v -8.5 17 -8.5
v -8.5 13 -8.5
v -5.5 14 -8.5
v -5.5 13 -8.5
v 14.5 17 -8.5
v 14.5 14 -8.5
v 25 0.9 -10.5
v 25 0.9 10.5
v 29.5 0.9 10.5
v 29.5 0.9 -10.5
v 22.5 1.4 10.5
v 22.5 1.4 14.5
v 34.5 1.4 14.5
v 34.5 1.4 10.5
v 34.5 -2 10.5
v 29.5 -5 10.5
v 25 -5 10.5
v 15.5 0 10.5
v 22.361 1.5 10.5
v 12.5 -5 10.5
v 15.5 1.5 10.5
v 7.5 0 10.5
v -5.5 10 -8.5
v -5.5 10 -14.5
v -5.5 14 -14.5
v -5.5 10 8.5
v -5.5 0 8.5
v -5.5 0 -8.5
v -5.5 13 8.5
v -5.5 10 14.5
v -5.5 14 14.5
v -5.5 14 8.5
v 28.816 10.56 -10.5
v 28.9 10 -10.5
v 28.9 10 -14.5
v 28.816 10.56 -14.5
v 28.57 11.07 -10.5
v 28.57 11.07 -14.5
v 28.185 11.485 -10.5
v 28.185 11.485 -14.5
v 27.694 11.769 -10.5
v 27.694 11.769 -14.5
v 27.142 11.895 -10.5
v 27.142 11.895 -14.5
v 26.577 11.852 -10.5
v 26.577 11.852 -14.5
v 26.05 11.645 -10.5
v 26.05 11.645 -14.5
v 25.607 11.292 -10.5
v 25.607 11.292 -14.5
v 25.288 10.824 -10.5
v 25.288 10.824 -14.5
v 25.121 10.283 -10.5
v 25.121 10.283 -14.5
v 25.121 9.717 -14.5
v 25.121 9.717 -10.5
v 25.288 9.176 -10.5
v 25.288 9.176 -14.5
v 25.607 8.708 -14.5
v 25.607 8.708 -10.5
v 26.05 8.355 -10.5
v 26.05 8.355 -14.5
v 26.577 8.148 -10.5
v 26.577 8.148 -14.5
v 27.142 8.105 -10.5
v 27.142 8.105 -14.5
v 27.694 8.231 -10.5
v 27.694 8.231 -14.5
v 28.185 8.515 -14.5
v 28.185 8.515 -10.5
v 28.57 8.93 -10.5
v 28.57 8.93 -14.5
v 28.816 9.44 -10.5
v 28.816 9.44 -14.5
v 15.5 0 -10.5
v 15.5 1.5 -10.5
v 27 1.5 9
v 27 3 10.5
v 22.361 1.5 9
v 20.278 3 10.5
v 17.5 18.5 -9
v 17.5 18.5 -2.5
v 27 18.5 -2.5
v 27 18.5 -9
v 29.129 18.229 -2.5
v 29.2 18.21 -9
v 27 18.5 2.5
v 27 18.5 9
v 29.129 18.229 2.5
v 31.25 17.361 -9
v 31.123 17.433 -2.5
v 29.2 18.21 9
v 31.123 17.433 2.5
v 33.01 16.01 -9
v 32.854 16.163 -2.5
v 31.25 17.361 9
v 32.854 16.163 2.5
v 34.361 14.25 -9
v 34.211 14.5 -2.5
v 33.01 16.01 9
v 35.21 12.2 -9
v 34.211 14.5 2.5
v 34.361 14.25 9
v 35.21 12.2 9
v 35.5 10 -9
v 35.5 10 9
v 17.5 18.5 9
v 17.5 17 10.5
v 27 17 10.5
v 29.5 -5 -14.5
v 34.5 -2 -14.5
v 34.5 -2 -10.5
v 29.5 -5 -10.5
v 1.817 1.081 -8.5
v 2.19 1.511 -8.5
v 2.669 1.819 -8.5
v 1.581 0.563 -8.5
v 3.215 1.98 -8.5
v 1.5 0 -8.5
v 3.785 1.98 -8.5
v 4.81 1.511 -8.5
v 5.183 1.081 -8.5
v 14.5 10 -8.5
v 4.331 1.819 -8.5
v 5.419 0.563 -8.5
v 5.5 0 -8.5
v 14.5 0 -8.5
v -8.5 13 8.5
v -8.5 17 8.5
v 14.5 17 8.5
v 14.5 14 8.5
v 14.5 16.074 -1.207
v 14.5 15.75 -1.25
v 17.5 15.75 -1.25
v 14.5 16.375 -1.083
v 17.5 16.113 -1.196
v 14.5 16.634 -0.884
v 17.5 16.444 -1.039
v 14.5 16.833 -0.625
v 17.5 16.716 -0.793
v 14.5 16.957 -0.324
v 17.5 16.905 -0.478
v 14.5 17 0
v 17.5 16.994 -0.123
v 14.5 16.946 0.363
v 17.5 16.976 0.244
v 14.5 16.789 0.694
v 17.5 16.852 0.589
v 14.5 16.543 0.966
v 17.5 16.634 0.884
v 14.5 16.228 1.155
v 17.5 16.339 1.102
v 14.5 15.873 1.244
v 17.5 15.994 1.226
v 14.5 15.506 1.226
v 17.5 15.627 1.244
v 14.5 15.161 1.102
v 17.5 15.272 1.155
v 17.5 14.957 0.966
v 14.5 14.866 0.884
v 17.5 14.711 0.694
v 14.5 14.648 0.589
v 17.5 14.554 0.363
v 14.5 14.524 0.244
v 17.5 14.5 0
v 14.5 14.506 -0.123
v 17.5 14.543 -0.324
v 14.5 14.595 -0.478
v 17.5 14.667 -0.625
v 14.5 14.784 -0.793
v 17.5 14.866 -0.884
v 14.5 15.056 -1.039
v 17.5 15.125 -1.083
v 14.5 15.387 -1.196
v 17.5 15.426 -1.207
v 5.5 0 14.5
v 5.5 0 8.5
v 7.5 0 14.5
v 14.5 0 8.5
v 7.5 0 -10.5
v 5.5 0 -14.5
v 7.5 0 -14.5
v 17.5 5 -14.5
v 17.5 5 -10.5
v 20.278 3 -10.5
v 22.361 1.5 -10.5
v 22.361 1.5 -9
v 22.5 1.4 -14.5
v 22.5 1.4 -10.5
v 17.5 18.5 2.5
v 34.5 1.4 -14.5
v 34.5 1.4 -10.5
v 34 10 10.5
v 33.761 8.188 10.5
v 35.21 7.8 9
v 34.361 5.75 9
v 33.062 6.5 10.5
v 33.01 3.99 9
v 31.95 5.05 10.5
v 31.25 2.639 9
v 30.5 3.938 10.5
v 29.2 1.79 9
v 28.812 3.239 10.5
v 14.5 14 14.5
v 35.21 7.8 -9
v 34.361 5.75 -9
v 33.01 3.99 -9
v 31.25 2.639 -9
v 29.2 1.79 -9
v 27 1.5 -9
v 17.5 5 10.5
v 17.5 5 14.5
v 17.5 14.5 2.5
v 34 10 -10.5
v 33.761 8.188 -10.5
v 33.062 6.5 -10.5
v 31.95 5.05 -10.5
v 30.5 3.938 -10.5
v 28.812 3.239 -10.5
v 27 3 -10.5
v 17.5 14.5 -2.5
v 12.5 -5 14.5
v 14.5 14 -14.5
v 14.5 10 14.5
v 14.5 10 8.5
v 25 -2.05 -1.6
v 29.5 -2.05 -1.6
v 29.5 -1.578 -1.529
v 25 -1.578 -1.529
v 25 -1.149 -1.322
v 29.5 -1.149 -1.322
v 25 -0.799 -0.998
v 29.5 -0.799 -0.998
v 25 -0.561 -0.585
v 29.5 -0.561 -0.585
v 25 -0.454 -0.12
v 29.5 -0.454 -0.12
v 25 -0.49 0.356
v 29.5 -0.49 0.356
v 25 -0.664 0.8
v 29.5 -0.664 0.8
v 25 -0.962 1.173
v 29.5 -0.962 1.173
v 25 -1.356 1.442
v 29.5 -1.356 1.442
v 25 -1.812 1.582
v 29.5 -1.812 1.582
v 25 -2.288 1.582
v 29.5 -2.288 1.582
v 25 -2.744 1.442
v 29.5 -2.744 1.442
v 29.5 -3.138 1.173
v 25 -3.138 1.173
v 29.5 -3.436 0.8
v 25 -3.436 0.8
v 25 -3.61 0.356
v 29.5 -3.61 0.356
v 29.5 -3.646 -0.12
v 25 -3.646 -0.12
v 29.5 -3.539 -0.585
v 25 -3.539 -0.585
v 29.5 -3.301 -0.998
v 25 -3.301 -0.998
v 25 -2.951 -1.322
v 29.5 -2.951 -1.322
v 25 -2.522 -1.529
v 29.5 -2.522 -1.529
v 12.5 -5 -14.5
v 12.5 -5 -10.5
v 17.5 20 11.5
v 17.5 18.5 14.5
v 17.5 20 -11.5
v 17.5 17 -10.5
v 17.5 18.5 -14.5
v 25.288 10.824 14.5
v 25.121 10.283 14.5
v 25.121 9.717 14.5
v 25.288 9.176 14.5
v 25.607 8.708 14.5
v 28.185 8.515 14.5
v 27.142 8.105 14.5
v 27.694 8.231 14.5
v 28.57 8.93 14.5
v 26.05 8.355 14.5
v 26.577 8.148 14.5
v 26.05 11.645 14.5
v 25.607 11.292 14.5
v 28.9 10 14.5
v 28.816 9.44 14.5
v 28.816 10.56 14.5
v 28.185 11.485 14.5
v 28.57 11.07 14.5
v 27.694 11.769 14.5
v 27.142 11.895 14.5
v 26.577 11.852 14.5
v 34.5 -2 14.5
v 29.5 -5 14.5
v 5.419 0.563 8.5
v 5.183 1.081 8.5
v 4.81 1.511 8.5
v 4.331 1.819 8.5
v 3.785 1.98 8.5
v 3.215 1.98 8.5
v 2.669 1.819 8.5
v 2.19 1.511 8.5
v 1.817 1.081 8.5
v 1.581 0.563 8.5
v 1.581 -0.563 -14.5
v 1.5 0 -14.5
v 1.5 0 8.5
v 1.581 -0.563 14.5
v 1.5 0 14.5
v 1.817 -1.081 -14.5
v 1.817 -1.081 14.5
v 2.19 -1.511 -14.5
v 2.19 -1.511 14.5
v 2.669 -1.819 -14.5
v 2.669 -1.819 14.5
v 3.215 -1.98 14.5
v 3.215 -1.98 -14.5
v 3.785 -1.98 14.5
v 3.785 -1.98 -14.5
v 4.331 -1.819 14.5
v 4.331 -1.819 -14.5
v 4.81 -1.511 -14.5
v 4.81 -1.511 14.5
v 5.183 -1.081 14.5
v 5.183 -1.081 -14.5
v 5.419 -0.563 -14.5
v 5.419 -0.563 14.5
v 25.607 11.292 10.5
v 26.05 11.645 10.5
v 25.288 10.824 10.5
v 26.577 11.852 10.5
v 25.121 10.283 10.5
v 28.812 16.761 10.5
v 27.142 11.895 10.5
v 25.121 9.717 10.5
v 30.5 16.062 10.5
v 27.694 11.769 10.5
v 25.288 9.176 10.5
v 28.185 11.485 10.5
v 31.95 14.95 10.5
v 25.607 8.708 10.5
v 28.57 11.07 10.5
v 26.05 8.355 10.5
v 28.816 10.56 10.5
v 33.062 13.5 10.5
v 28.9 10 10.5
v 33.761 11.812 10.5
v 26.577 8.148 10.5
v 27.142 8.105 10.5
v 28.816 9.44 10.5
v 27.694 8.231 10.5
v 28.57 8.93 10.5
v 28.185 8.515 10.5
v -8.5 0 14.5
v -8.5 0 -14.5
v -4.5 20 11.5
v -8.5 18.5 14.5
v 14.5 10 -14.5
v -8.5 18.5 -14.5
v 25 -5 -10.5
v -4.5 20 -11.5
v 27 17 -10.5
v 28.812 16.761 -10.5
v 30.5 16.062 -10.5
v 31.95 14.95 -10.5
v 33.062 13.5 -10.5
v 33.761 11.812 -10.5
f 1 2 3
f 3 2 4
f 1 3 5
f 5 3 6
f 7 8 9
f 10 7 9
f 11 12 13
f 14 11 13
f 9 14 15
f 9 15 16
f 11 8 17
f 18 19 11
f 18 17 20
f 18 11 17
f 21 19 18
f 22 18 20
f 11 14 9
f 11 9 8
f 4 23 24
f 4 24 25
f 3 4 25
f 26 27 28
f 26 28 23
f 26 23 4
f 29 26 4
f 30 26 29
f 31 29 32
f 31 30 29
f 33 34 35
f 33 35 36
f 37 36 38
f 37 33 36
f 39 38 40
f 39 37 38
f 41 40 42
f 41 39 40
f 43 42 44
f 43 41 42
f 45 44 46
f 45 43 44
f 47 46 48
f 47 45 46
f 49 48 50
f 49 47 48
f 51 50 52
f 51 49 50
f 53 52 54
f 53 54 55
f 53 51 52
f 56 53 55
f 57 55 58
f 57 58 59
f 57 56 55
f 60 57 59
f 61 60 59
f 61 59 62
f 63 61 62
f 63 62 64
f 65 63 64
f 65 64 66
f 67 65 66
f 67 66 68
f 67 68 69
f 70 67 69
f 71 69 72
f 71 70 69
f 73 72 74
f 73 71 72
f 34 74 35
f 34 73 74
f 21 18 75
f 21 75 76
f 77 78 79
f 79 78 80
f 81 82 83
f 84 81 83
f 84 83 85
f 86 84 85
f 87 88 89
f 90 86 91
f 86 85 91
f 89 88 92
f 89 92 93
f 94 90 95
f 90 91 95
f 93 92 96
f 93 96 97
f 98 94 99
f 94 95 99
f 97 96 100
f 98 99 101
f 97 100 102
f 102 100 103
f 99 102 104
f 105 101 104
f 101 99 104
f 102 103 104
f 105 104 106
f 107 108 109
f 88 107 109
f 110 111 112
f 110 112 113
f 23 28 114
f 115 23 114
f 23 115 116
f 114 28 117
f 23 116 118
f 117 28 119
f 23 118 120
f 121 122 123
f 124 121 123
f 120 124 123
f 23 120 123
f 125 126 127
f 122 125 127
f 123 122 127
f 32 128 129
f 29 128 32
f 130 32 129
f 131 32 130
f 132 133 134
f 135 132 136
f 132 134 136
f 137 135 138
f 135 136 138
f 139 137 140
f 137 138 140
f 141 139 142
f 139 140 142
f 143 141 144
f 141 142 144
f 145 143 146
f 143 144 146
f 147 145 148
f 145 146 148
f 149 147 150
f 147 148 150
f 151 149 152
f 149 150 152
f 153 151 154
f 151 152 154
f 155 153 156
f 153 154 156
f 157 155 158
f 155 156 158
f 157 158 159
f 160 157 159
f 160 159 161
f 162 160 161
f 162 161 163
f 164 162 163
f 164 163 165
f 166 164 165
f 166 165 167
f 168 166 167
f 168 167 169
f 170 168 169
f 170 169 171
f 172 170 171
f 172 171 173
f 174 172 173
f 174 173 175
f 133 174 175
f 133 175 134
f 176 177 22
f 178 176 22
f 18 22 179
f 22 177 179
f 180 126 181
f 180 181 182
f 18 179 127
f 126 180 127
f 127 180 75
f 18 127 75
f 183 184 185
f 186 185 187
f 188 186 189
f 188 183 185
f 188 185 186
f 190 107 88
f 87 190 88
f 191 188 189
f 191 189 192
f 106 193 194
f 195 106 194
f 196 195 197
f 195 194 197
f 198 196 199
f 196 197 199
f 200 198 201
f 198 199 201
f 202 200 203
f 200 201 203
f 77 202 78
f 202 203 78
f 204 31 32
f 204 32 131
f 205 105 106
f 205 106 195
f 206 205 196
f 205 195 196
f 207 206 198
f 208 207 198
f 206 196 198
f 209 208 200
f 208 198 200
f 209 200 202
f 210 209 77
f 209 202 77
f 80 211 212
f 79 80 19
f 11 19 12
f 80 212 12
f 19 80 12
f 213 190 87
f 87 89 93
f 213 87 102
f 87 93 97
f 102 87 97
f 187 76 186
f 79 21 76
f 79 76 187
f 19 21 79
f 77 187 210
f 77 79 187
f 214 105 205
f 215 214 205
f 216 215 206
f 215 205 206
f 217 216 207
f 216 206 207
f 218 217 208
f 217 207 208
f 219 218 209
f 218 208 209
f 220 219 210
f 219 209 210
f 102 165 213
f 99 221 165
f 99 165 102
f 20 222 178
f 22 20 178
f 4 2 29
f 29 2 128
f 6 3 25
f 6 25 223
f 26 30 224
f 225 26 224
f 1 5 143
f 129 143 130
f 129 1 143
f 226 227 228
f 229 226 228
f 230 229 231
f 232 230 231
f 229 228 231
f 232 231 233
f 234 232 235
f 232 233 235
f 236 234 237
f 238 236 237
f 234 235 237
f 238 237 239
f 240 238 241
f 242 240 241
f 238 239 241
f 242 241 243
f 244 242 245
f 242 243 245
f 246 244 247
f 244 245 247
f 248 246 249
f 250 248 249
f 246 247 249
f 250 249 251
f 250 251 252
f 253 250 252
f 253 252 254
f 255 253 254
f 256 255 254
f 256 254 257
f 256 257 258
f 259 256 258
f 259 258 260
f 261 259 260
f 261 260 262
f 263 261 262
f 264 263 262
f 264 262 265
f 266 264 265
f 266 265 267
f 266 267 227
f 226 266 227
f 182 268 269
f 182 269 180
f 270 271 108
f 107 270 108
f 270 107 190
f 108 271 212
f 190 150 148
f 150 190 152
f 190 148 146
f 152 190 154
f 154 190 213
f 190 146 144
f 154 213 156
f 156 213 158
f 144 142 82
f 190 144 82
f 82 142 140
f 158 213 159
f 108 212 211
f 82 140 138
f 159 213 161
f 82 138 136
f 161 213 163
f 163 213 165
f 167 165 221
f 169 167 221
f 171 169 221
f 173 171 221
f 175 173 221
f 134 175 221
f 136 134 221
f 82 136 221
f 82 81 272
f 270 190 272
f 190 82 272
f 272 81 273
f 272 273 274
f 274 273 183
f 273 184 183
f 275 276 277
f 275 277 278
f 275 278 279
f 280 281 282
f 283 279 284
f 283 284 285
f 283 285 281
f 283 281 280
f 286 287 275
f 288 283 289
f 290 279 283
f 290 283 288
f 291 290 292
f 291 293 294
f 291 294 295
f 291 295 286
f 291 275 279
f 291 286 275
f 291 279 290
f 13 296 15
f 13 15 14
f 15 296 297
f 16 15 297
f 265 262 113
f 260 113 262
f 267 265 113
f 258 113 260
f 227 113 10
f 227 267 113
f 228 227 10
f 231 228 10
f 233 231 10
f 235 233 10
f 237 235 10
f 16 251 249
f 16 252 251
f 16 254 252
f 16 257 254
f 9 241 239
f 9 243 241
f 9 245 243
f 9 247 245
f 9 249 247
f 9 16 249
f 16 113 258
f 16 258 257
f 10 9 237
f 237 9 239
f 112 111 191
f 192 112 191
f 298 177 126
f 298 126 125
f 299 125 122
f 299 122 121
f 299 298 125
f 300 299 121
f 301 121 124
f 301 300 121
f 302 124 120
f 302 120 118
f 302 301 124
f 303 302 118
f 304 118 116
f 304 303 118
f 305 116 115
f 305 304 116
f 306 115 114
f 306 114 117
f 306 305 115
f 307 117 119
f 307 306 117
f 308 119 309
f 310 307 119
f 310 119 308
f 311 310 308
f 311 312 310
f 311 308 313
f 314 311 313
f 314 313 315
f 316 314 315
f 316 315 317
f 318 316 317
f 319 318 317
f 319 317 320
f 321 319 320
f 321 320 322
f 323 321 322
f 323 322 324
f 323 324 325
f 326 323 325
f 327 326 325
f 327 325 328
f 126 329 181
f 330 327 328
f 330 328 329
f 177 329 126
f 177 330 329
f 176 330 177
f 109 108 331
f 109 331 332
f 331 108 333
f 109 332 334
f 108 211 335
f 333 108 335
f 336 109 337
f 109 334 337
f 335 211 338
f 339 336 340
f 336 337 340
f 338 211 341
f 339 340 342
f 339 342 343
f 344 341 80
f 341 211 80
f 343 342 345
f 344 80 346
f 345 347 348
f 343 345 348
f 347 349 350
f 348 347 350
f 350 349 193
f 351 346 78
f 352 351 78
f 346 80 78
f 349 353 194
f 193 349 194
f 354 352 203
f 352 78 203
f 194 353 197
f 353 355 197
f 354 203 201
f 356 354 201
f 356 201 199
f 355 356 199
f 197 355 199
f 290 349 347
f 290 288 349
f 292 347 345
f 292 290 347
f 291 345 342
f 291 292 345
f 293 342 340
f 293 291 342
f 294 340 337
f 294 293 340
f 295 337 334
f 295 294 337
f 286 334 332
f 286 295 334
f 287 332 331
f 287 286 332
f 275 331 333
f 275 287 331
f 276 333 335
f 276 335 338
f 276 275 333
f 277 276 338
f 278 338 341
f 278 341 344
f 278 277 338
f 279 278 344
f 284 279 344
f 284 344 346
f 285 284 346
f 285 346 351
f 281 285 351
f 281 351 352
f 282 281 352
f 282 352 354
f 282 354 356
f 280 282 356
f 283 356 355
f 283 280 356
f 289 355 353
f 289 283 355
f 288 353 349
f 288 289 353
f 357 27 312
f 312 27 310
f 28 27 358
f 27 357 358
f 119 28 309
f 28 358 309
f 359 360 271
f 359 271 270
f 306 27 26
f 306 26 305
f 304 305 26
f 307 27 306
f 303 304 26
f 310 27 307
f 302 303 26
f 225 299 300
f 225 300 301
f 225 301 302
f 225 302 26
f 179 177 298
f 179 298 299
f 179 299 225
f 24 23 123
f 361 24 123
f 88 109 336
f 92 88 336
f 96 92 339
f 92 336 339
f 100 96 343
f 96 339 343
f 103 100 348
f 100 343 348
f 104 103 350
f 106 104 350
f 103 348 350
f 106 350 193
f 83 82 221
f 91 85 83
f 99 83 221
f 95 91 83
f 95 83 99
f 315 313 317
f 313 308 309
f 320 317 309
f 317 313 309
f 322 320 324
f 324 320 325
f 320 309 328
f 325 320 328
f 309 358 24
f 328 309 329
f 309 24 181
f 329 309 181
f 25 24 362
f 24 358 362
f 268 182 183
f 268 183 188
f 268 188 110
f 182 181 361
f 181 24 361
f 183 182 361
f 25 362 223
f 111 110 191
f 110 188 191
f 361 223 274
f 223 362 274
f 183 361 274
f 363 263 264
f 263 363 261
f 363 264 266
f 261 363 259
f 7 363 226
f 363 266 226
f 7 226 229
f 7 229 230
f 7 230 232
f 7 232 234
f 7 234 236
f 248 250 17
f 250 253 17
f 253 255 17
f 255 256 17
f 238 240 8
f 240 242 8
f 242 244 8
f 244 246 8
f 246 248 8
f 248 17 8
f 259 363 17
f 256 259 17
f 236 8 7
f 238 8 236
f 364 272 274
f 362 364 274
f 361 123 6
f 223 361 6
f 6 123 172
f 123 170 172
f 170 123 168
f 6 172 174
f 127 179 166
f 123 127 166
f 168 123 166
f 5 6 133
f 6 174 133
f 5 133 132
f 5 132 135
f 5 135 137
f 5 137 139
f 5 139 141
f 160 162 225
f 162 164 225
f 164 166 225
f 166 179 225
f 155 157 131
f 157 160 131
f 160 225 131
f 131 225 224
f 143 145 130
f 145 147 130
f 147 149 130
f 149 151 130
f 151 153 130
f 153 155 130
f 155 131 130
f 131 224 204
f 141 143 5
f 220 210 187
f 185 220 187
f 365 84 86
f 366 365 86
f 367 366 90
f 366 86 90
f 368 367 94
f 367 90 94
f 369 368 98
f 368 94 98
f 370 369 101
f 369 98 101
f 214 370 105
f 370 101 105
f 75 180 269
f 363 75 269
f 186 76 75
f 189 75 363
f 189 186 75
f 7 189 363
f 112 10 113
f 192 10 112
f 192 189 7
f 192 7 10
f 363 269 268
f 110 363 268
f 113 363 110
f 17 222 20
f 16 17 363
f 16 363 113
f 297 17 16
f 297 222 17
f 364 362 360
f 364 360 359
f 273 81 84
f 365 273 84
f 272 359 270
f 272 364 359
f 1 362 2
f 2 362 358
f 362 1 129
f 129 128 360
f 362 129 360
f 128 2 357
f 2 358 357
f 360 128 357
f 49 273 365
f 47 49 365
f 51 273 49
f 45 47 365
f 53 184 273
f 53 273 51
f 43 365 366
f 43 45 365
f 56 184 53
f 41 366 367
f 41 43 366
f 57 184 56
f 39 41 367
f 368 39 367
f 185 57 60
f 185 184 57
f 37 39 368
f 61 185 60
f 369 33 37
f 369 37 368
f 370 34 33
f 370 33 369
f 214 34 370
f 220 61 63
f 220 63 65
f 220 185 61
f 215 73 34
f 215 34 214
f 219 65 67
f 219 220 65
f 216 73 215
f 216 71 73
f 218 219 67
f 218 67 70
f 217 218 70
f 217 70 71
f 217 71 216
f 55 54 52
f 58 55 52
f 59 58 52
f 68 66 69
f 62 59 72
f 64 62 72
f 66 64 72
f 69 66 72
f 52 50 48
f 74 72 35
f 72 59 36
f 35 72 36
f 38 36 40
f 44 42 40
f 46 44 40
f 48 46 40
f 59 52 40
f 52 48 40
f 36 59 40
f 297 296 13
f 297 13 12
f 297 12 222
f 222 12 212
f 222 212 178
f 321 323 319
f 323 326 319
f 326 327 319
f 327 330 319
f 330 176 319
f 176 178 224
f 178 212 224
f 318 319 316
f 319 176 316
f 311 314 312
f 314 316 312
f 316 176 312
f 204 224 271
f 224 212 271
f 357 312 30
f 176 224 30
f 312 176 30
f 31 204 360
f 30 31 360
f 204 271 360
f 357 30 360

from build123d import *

# Parameters (mm, degrees)
SKETCH1_W                = 18
SKETCH1_H                = 21
BOSS_EXTRUDE1_DEPTH      = 20
CUT_EXTRUDE3_DEPTH       = 30
CUT_EXTRUDE4_DEPTH       = 27
SKETCH6_W                = 20
SKETCH6_H                = 17
CUT_EXTRUDE5_DEPTH       = 17
SKETCH9_W                = 17
SKETCH9_H                = 4
CUT_EXTRUDE7_DEPTH       = 4
SKETCH10_W               = 20
SKETCH10_H               = 4
CUT_EXTRUDE8_DEPTH       = 30
BOSS_EXTRUDE3_DEPTH      = 4
SKETCH13_W               = 18
SKETCH13_H               = 1.5
SKETCH13_W_2             = 20
CUT_EXTRUDE11_DEPTH      = 21
CUT_EXTRUDE12_DEPTH      = 26
SKETCH16_R               = 1.9
BOSS_EXTRUDE4_DEPTH      = 14.5
SKETCH22_R               = 1.25
CUT_EXTRUDE15_DEPTH      = 19
CUT_EXTRUDE15_DEPTH_BACK = 27
CHAMFER1_SIZE            = 1.5
SKETCH23_W               = 18
SKETCH23_H               = 5
CUT_EXTRUDE16_DEPTH      = 4
SKETCH24_R               = 2
BOSS_EXTRUDE7_DEPTH      = 29
BOSS_EXTRUDE8_REACH      = 31
SKETCH25_W               = 4.5
SKETCH25_H               = 5.9
SKETCH26_R               = 1.6
CUT_EXTRUDE17_DEPTH      = 10


with BuildPart() as part:
    # Sketch1 → Boss-Extrude1 (new body)
    with BuildSketch(Plane(origin=(0, 0, 0), x_dir=(1, 0, 0), z_dir=(0, 1, 0))):
        Polygon((17.5, 14.5), (-8.5, 14.5), (-8.5, -14.5), (17.5, -14.5), (17.5, -10.5), (17.5, 10.5), align=None)
        with Locations((26.5, 0)):
            Rectangle(SKETCH1_W, SKETCH1_H)
    extrude(amount=BOSS_EXTRUDE1_DEPTH)

    # Sketch3 → Cut-Extrude3 (cut, through all)
    with BuildSketch(Plane.XY.offset(14.5)):
        Polygon((-8.5, 20), (-8.5, 18.5), (-4.5, 20), align=None)
    extrude(amount=-CUT_EXTRUDE3_DEPTH, mode=Mode.SUBTRACT)

    # Sketch4 → Cut-Extrude4 (cut, through all)
    with BuildSketch(Plane(origin=(17.5, 0, 0), x_dir=(0, 0, -1), z_dir=(1, 0, 0))):
        Polygon((-14.5, 20), (-14.5, 18.5), (-11.5, 20), align=None)
        Polygon((14.5, 20), (11.5, 20), (14.5, 18.5), align=None)
    extrude(amount=-CUT_EXTRUDE4_DEPTH, mode=Mode.SUBTRACT)

    # Sketch6 → Cut-Extrude5 (cut)
    with BuildSketch(Plane.XZ):
        with Locations((4.5, 0)):
            Rectangle(SKETCH6_W, SKETCH6_H)
    extrude(amount=-CUT_EXTRUDE5_DEPTH, mode=Mode.SUBTRACT)

    # Sketch9 → Cut-Extrude7 (cut)
    with BuildSketch(Plane.ZY.offset(8.5)):
        with Locations((0, 15)):
            Rectangle(SKETCH9_W, SKETCH9_H)
    extrude(amount=-CUT_EXTRUDE7_DEPTH, mode=Mode.SUBTRACT)

    # Sketch10 → Cut-Extrude8 (cut, through all)
    with BuildSketch(Plane.XY.offset(14.5)):
        with Locations((4.5, 12)):
            Rectangle(SKETCH10_W, SKETCH10_H)
    extrude(amount=-CUT_EXTRUDE8_DEPTH, mode=Mode.SUBTRACT)

    # Sketch12 → Boss-Extrude3 (add)
    with BuildSketch(Plane.XY.offset(14.5)):
        Polygon((22.5, 1.4), (34.5, 1.4), (34.5, 0), (34.5, -2), (29.5, -5), (12.5, -5), (7.5, 0), (17.5, 0), (17.5, 5), align=None)
    boss_extrude3 = extrude(amount=-BOSS_EXTRUDE3_DEPTH)

    # Mirror1: Boss-Extrude3 across plane
    add(boss_extrude3.mirror(Plane.XY))

    # Sketch13 → Cut-Extrude11 (cut)
    with BuildSketch(Plane.XY.offset(10.5)):
        with Locations((26.5, 19.25)):
            Rectangle(SKETCH13_W, SKETCH13_H)
        with Locations((25.5, 0.75)):
            Rectangle(SKETCH13_W_2, SKETCH13_H)
    extrude(amount=-CUT_EXTRUDE11_DEPTH, mode=Mode.SUBTRACT)

    # Sketch14 → Cut-Extrude12 (cut, through all)
    with BuildSketch(Plane.XY.offset(10.5)):
        with BuildLine():
            ThreePointArc((35.5, 10), (33.01040764, 3.98959236), (27, 1.5))
            Line((27, 1.5), (35.5, 1.5))
            Line((35.5, 1.5), (35.5, 10))
        make_face()
        with BuildLine():
            Line((35.5, 18.5), (27, 18.5))
            ThreePointArc((27, 18.5), (33.01040764, 16.01040764), (35.5, 10))
            Line((35.5, 10), (35.5, 18.5))
        make_face()
    extrude(amount=-CUT_EXTRUDE12_DEPTH, mode=Mode.SUBTRACT)

    # Sketch16 → Boss-Extrude4 (add, symmetric)
    with BuildSketch(Plane.XY):
        with Locations((27, 10)):
            Circle(SKETCH16_R)
    extrude(amount=BOSS_EXTRUDE4_DEPTH, both=True)

    # Sketch22 → Cut-Extrude15 (cut, two sides)
    with BuildSketch(Plane(origin=(17.5, 0, 0), x_dir=(0, 0, -1), z_dir=(1, 0, 0))) as cut_extrude15_sk:
        with Locations((0, 15.75)):
            Circle(SKETCH22_R)
    extrude(amount=CUT_EXTRUDE15_DEPTH, mode=Mode.SUBTRACT)
    extrude(cut_extrude15_sk.sketch, amount=-CUT_EXTRUDE15_DEPTH_BACK, mode=Mode.SUBTRACT)

    # Chamfer1
    chamfer1_edges = [part.edges().sort_by_distance(p)[0] for p in [
        (22.25, 18.5, -10.5),
        (22.25, 18.5, 10.5),
        (24.680555556, 1.5, 10.5),
        (24.680555556, 1.5, -10.5),
        (35.5, 10, -10.5),
        (35.5, 10, 10.5),
    ]]
    chamfer(chamfer1_edges, length=CHAMFER1_SIZE)

    # Sketch23 → Cut-Extrude16 (cut)
    with BuildSketch(Plane(origin=(0, 18.5, 0), x_dir=(1, 0, 0), z_dir=(0, 1, 0))):
        with Locations((26.5, 0)):
            Rectangle(SKETCH23_W, SKETCH23_H)
    extrude(amount=-CUT_EXTRUDE16_DEPTH, mode=Mode.SUBTRACT)

    # Sketch24 → Boss-Extrude7 (add, through all)
    with BuildSketch(Plane.XY.offset(14.5)):
        with Locations((3.5, 0)):
            Circle(SKETCH24_R)
    extrude(amount=-BOSS_EXTRUDE7_DEPTH)

    # Sketch25 → Boss-Extrude8 (add, up to next)
    with BuildSketch(Plane.XY.offset(14.5), mode=Mode.PRIVATE) as boss_extrude8_sk1:
        with Locations((27.25, -2.05)):
            Rectangle(SKETCH25_W, SKETCH25_H)
    boss_extrude8_tool1 = extrude(boss_extrude8_sk1.sketch, amount=-BOSS_EXTRUDE8_REACH, mode=Mode.PRIVATE) - part.part
    add(boss_extrude8_tool1.solids().sort_by_distance((27.25, -2.05, 14.5))[0])

    # Sketch26 → Cut-Extrude17 (cut)
    with BuildSketch(Plane(origin=(29.5, 0, 0), x_dir=(0, 0, -1), z_dir=(1, 0, 0))):
        with Locations((0, -2.05)):
            Circle(SKETCH26_R)
    extrude(amount=-CUT_EXTRUDE17_DEPTH, mode=Mode.SUBTRACT)


solid = part.part
